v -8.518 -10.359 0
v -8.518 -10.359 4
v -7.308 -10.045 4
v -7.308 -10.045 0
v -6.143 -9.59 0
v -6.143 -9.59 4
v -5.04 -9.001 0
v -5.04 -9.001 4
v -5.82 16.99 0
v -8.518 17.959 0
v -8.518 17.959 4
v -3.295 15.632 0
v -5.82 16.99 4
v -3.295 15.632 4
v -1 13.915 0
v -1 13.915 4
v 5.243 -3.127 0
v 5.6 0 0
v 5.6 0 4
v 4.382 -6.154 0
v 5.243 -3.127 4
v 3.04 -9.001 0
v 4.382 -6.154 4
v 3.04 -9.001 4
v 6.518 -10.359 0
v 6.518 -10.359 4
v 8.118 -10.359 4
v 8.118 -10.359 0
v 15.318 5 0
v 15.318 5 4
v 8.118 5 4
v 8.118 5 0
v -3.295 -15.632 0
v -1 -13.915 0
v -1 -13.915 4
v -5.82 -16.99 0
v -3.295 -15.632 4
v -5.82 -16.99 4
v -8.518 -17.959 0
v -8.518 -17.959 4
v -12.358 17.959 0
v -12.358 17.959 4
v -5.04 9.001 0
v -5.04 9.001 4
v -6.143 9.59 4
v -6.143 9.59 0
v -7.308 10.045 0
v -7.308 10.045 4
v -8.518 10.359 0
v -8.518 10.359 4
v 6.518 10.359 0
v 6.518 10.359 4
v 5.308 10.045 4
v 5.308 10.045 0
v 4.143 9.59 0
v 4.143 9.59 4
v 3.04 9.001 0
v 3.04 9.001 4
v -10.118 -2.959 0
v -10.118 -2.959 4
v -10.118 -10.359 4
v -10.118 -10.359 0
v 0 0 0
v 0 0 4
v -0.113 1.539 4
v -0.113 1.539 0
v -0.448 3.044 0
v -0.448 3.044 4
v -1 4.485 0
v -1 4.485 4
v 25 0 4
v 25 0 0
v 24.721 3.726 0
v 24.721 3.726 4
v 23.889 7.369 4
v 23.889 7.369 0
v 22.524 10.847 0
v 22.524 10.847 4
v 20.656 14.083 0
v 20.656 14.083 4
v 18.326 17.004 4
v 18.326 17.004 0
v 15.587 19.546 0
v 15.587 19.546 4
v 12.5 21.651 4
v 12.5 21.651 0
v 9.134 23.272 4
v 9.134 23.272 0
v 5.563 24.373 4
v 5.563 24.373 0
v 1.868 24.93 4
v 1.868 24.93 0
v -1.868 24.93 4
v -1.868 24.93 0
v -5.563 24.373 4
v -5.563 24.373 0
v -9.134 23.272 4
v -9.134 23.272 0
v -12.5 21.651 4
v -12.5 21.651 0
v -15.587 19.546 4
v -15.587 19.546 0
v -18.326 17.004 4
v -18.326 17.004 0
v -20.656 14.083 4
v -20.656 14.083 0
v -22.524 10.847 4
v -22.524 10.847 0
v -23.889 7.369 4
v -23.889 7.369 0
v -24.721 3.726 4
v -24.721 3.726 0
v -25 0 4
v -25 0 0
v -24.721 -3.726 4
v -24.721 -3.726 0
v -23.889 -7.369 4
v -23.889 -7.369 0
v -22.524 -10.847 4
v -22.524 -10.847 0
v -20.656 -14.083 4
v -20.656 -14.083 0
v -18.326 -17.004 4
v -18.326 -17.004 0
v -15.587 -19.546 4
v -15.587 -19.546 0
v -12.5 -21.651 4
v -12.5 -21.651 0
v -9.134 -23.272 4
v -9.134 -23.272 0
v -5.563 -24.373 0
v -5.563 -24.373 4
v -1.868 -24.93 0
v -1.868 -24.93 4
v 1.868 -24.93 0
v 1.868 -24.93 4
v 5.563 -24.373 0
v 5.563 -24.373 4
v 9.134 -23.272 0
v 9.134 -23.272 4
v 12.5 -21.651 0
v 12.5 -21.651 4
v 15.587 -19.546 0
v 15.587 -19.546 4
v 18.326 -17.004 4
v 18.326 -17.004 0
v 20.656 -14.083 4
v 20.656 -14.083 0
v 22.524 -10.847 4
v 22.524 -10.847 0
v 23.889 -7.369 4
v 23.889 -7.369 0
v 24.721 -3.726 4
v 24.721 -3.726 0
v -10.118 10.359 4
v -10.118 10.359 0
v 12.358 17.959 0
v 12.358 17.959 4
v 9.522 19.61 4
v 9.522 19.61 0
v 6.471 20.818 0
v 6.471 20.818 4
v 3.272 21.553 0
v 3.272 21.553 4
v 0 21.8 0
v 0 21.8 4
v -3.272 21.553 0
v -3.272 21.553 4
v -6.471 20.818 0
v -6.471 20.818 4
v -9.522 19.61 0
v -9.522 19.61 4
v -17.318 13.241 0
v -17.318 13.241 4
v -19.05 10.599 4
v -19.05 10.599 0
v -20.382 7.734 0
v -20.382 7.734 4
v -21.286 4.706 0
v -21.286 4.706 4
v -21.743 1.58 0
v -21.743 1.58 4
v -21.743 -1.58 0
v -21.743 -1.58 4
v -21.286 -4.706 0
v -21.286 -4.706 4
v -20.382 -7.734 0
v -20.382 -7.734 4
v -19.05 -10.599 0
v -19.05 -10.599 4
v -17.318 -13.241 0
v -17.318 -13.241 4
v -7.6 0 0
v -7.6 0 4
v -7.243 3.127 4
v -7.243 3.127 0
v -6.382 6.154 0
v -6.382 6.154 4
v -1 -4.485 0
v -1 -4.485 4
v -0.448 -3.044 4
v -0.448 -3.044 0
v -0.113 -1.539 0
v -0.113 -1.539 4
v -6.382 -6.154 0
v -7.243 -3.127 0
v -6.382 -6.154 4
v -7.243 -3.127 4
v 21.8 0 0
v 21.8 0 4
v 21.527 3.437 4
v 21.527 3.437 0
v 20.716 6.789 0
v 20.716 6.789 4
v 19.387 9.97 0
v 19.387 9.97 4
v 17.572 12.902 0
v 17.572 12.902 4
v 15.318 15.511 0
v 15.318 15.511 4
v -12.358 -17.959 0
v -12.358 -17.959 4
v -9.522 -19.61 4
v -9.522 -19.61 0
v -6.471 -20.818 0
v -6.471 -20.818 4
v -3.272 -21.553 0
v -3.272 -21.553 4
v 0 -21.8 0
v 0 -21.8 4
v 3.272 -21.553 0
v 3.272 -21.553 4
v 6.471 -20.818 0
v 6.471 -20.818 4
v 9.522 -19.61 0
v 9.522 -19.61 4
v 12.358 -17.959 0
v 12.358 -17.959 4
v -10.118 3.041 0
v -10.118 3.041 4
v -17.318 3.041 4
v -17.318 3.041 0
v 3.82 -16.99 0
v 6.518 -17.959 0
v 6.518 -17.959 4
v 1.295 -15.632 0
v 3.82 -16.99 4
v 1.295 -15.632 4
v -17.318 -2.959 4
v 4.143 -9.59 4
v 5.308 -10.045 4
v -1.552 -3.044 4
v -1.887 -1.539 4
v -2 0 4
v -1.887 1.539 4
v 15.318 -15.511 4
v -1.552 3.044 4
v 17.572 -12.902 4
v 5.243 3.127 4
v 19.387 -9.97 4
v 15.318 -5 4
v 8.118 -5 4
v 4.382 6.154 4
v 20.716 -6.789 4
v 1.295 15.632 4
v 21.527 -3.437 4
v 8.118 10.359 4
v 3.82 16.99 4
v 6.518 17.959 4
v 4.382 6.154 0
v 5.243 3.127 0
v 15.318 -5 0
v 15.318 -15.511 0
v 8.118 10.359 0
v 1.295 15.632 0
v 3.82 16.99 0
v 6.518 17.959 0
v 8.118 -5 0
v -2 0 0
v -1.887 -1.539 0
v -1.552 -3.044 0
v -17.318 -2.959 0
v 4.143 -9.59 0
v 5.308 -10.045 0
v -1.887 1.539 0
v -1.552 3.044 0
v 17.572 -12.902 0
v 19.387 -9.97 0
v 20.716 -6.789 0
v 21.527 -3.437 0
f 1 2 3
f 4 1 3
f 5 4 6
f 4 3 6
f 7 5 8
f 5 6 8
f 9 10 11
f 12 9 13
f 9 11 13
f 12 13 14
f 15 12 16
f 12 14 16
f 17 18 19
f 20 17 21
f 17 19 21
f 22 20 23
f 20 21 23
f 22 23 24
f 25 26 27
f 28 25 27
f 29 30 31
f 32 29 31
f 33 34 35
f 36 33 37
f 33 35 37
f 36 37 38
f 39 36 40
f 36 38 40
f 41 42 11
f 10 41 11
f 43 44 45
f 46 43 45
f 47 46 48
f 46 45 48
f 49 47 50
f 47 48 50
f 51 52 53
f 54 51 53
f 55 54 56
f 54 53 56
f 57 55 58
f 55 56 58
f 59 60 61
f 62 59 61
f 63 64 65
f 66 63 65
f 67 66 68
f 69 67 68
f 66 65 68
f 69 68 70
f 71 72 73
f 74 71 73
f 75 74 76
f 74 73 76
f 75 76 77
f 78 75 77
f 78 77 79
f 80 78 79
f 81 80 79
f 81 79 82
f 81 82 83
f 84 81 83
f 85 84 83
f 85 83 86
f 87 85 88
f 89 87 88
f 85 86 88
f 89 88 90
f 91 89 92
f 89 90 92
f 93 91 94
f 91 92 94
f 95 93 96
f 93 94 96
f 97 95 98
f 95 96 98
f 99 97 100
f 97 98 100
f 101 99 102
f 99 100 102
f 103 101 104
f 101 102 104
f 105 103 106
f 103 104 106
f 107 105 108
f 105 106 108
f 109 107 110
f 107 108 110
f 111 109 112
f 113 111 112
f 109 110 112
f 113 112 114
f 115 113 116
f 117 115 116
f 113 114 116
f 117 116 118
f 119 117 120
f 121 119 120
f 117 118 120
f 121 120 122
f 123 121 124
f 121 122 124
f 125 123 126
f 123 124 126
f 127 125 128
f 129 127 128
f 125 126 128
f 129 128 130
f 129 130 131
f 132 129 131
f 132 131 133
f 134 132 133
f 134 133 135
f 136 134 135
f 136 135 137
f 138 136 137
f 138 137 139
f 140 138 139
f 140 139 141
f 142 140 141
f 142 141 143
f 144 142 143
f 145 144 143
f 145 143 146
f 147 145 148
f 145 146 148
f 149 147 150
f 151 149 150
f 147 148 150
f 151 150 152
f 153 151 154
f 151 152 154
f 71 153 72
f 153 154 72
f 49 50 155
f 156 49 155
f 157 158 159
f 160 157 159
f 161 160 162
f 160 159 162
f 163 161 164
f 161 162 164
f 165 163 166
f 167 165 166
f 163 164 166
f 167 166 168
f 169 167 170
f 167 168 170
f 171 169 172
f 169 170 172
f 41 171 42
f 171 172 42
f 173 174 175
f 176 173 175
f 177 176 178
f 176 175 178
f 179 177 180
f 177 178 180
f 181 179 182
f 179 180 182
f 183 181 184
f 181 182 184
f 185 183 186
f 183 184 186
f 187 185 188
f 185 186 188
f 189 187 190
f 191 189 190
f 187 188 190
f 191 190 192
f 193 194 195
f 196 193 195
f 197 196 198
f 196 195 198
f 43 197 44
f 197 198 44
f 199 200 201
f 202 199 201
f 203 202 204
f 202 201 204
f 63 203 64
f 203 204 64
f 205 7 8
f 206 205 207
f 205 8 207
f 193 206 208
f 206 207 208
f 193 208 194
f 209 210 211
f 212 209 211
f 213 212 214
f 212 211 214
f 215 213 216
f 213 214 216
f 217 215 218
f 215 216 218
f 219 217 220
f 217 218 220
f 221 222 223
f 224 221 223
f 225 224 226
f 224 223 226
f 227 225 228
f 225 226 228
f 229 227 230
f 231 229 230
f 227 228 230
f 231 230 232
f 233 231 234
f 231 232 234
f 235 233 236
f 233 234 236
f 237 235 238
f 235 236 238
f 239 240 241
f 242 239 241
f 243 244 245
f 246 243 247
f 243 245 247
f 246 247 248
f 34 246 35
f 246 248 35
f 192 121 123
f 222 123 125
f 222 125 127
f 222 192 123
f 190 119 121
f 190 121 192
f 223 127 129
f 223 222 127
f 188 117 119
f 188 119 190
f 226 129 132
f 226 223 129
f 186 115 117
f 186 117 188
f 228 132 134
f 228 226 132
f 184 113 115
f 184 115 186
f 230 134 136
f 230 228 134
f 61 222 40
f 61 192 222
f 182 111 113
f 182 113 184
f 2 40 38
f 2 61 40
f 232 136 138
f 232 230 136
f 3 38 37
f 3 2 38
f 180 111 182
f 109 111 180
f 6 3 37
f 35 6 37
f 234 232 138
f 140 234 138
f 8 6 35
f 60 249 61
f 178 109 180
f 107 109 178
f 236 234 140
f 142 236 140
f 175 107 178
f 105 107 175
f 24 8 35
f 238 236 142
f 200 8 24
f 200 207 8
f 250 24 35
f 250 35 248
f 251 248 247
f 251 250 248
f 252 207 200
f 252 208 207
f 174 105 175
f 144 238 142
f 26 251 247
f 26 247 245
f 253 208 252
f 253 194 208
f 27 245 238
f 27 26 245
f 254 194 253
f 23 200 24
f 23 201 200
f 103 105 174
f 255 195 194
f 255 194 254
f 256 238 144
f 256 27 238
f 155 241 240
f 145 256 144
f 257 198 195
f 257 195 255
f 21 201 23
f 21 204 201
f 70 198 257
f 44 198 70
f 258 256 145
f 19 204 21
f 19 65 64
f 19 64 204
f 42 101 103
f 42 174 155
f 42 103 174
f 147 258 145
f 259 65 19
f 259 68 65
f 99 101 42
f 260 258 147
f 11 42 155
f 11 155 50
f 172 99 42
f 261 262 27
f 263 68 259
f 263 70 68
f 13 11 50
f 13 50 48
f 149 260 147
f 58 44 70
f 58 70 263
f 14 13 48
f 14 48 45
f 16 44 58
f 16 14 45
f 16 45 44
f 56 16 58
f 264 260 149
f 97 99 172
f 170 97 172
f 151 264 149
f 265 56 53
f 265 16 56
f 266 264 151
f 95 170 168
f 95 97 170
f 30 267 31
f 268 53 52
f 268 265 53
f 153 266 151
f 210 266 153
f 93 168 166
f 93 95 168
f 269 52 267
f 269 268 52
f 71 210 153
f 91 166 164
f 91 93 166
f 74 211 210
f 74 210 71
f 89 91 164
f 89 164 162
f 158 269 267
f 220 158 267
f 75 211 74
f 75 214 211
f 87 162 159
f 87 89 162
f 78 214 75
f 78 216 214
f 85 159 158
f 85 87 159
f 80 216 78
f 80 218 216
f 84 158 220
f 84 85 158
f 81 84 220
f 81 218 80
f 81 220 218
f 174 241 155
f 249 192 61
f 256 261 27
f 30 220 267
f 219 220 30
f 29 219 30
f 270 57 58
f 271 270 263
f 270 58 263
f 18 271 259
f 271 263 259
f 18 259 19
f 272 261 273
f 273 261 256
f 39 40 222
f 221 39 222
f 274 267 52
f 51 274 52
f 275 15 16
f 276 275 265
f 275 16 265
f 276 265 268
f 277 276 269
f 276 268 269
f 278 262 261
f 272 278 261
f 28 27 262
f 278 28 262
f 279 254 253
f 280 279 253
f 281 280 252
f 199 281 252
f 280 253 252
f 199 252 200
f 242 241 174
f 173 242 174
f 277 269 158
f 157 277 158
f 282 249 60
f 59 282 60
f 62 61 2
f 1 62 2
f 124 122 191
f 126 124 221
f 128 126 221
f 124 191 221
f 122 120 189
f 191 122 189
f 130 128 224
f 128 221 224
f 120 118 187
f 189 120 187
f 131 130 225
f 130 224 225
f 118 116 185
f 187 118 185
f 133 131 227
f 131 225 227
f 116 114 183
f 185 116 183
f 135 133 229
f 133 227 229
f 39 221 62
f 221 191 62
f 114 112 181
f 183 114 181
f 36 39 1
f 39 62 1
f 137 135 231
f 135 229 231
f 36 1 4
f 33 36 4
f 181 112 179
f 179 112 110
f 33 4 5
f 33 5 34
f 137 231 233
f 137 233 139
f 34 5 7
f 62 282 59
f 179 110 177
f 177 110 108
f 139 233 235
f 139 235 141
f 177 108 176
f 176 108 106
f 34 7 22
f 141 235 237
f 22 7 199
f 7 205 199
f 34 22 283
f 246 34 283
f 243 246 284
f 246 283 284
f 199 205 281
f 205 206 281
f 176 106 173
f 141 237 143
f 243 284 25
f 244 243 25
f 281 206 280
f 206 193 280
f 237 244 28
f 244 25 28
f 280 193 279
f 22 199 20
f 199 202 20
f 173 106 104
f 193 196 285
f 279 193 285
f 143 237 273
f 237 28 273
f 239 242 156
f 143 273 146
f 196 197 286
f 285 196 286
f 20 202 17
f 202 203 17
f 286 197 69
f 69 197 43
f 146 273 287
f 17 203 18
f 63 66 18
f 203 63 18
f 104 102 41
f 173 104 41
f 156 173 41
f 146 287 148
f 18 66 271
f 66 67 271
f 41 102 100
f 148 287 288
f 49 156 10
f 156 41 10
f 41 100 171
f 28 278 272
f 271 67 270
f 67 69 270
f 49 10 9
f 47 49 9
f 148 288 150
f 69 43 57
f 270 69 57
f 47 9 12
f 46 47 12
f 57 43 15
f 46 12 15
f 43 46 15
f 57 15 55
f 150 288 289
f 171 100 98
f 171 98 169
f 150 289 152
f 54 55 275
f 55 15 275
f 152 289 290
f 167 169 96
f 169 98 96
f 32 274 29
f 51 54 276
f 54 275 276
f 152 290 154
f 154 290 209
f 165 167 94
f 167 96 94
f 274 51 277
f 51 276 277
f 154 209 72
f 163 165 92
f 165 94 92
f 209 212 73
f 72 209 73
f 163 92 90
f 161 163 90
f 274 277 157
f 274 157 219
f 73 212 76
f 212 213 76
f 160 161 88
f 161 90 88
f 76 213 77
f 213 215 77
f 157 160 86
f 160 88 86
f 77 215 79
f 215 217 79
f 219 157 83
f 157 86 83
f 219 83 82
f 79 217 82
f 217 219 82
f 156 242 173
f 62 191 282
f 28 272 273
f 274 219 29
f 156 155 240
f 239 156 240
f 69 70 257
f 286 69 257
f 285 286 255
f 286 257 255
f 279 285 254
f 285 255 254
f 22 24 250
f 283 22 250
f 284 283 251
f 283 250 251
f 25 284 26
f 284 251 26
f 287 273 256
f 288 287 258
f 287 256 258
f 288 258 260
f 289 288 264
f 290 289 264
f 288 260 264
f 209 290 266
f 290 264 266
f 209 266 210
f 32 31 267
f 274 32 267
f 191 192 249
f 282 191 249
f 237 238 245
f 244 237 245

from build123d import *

# Parameters (mm, degrees)
F0_R     = 25
F1_DEPTH = 4
F3_DEPTH = 5


with BuildPart() as f1:
    # F0 (on Top) → F1 (new body)
    with BuildSketch(Plane.XY):
        Circle(F0_R)
    extrude(amount=F1_DEPTH)

    # F2 (on face) → F3 (cut)
    with BuildSketch(Plane.XY.offset(4)):
        with BuildLine():
            Line((-17.318032, 10.358936), (-17.318032, 13.241064))
            ThreePointArc((-17.318032, 13.241064), (-21.8, 0), (-17.318032, -13.241064))
            Line((-17.318032, -13.241064), (-17.318032, -5.958936))
            Line((-17.318032, -5.958936), (-17.318032, -2.958936))
            Line((-17.318032, -2.958936), (-10.118032, -2.958936))
            Line((-10.118032, -2.958936), (-10.118032, -5.958936))
            Line((-10.118032, -5.958936), (-10.118032, -10.358936))
            Line((-10.118032, -10.358936), (-8.518032, -10.358936))
            ThreePointArc((-8.518032, -10.358936), (-6.718569, -9.835054), (-5.040088, -9.001257))
            ThreePointArc((-5.040088, -9.001257), (-6.874725, -4.658377), (-7.6, 0))
            ThreePointArc((-7.6, 0), (-6.874725, 4.658377), (-5.040088, 9.001257))
            ThreePointArc((-5.040088, 9.001257), (-6.718569, 9.835054), (-8.518032, 10.358936))
            Line((-8.518032, 10.358936), (-10.118032, 10.358936))
            Line((-10.118032, 10.358936), (-10.118032, 3.041064))
            Line((-10.118032, 3.041064), (-17.318032, 3.041064))
            Line((-17.318032, 3.041064), (-17.318032, 10.358936))
        make_face()
        with BuildLine():
            ThreePointArc((0, 0), (-0.253032, 2.297592), (-1, 4.485056))
            ThreePointArc((-1, 4.485056), (-1.746968, 2.297592), (-2, 0))
            ThreePointArc((-2, 0), (-1.746968, -2.297592), (-1, -4.485056))
            ThreePointArc((-1, -4.485056), (-0.253032, -2.297592), (0, 0))
        make_face()
        with BuildLine():
            Line((6.518032, 17.958936), (12.357857, 17.958936))
            ThreePointArc((12.357857, 17.958936), (0, 21.8), (-12.357857, 17.958936))
            Line((-12.357857, 17.958936), (-8.518032, 17.958936))
            ThreePointArc((-8.518032, 17.958936), (-4.532276, 16.358457), (-1, 13.914934))
            ThreePointArc((-1, 13.914934), (2.532276, 16.358457), (6.518032, 17.958936))
        make_face()
        with BuildLine():
            ThreePointArc((15.318032, -15.511219), (20.114337, -8.405561), (21.8, 0))
            ThreePointArc((21.8, 0), (20.114337, 8.405561), (15.318032, 15.511219))
            Line((15.318032, 15.511219), (15.318032, 10.358936))
            Line((15.318032, 10.358936), (15.318032, 5))
            Line((15.318032, 5), (8.118032, 5))
            Line((8.118032, 5), (8.118032, 10.358936))
            Line((8.118032, 10.358936), (6.518032, 10.358936))
            ThreePointArc((6.518032, 10.358936), (4.718569, 9.835054), (3.040088, 9.001257))
            ThreePointArc((3.040088, 9.001257), (4.874725, 4.658377), (5.6, 0))
            ThreePointArc((5.6, 0), (4.874725, -4.658377), (3.040088, -9.001257))
            ThreePointArc((3.040088, -9.001257), (4.718569, -9.835054), (6.518032, -10.358936))
            Line((6.518032, -10.358936), (8.118032, -10.358936))
            Line((8.118032, -10.358936), (8.118032, -4.999936))
            Line((8.118032, -4.999936), (15.318032, -4.999936))
            Line((15.318032, -4.999936), (15.318032, -10.358936))
            Line((15.318032, -10.358936), (15.318032, -15.511219))
        make_face()
        with BuildLine():
            ThreePointArc((-12.357857, -17.958936), (0, -21.8), (12.357857, -17.958936))
            Line((12.357857, -17.958936), (10.357857, -17.958936))
            Line((10.357857, -17.958936), (6.518032, -17.958936))
            ThreePointArc((6.518032, -17.958936), (2.532276, -16.358457), (-1, -13.914934))
            ThreePointArc((-1, -13.914934), (-4.532276, -16.358457), (-8.518032, -17.958936))
            Line((-8.518032, -17.958936), (-12.357857, -17.958936))
        make_face()
    extrude(amount=-F3_DEPTH, mode=Mode.SUBTRACT)


solid = f1.part
